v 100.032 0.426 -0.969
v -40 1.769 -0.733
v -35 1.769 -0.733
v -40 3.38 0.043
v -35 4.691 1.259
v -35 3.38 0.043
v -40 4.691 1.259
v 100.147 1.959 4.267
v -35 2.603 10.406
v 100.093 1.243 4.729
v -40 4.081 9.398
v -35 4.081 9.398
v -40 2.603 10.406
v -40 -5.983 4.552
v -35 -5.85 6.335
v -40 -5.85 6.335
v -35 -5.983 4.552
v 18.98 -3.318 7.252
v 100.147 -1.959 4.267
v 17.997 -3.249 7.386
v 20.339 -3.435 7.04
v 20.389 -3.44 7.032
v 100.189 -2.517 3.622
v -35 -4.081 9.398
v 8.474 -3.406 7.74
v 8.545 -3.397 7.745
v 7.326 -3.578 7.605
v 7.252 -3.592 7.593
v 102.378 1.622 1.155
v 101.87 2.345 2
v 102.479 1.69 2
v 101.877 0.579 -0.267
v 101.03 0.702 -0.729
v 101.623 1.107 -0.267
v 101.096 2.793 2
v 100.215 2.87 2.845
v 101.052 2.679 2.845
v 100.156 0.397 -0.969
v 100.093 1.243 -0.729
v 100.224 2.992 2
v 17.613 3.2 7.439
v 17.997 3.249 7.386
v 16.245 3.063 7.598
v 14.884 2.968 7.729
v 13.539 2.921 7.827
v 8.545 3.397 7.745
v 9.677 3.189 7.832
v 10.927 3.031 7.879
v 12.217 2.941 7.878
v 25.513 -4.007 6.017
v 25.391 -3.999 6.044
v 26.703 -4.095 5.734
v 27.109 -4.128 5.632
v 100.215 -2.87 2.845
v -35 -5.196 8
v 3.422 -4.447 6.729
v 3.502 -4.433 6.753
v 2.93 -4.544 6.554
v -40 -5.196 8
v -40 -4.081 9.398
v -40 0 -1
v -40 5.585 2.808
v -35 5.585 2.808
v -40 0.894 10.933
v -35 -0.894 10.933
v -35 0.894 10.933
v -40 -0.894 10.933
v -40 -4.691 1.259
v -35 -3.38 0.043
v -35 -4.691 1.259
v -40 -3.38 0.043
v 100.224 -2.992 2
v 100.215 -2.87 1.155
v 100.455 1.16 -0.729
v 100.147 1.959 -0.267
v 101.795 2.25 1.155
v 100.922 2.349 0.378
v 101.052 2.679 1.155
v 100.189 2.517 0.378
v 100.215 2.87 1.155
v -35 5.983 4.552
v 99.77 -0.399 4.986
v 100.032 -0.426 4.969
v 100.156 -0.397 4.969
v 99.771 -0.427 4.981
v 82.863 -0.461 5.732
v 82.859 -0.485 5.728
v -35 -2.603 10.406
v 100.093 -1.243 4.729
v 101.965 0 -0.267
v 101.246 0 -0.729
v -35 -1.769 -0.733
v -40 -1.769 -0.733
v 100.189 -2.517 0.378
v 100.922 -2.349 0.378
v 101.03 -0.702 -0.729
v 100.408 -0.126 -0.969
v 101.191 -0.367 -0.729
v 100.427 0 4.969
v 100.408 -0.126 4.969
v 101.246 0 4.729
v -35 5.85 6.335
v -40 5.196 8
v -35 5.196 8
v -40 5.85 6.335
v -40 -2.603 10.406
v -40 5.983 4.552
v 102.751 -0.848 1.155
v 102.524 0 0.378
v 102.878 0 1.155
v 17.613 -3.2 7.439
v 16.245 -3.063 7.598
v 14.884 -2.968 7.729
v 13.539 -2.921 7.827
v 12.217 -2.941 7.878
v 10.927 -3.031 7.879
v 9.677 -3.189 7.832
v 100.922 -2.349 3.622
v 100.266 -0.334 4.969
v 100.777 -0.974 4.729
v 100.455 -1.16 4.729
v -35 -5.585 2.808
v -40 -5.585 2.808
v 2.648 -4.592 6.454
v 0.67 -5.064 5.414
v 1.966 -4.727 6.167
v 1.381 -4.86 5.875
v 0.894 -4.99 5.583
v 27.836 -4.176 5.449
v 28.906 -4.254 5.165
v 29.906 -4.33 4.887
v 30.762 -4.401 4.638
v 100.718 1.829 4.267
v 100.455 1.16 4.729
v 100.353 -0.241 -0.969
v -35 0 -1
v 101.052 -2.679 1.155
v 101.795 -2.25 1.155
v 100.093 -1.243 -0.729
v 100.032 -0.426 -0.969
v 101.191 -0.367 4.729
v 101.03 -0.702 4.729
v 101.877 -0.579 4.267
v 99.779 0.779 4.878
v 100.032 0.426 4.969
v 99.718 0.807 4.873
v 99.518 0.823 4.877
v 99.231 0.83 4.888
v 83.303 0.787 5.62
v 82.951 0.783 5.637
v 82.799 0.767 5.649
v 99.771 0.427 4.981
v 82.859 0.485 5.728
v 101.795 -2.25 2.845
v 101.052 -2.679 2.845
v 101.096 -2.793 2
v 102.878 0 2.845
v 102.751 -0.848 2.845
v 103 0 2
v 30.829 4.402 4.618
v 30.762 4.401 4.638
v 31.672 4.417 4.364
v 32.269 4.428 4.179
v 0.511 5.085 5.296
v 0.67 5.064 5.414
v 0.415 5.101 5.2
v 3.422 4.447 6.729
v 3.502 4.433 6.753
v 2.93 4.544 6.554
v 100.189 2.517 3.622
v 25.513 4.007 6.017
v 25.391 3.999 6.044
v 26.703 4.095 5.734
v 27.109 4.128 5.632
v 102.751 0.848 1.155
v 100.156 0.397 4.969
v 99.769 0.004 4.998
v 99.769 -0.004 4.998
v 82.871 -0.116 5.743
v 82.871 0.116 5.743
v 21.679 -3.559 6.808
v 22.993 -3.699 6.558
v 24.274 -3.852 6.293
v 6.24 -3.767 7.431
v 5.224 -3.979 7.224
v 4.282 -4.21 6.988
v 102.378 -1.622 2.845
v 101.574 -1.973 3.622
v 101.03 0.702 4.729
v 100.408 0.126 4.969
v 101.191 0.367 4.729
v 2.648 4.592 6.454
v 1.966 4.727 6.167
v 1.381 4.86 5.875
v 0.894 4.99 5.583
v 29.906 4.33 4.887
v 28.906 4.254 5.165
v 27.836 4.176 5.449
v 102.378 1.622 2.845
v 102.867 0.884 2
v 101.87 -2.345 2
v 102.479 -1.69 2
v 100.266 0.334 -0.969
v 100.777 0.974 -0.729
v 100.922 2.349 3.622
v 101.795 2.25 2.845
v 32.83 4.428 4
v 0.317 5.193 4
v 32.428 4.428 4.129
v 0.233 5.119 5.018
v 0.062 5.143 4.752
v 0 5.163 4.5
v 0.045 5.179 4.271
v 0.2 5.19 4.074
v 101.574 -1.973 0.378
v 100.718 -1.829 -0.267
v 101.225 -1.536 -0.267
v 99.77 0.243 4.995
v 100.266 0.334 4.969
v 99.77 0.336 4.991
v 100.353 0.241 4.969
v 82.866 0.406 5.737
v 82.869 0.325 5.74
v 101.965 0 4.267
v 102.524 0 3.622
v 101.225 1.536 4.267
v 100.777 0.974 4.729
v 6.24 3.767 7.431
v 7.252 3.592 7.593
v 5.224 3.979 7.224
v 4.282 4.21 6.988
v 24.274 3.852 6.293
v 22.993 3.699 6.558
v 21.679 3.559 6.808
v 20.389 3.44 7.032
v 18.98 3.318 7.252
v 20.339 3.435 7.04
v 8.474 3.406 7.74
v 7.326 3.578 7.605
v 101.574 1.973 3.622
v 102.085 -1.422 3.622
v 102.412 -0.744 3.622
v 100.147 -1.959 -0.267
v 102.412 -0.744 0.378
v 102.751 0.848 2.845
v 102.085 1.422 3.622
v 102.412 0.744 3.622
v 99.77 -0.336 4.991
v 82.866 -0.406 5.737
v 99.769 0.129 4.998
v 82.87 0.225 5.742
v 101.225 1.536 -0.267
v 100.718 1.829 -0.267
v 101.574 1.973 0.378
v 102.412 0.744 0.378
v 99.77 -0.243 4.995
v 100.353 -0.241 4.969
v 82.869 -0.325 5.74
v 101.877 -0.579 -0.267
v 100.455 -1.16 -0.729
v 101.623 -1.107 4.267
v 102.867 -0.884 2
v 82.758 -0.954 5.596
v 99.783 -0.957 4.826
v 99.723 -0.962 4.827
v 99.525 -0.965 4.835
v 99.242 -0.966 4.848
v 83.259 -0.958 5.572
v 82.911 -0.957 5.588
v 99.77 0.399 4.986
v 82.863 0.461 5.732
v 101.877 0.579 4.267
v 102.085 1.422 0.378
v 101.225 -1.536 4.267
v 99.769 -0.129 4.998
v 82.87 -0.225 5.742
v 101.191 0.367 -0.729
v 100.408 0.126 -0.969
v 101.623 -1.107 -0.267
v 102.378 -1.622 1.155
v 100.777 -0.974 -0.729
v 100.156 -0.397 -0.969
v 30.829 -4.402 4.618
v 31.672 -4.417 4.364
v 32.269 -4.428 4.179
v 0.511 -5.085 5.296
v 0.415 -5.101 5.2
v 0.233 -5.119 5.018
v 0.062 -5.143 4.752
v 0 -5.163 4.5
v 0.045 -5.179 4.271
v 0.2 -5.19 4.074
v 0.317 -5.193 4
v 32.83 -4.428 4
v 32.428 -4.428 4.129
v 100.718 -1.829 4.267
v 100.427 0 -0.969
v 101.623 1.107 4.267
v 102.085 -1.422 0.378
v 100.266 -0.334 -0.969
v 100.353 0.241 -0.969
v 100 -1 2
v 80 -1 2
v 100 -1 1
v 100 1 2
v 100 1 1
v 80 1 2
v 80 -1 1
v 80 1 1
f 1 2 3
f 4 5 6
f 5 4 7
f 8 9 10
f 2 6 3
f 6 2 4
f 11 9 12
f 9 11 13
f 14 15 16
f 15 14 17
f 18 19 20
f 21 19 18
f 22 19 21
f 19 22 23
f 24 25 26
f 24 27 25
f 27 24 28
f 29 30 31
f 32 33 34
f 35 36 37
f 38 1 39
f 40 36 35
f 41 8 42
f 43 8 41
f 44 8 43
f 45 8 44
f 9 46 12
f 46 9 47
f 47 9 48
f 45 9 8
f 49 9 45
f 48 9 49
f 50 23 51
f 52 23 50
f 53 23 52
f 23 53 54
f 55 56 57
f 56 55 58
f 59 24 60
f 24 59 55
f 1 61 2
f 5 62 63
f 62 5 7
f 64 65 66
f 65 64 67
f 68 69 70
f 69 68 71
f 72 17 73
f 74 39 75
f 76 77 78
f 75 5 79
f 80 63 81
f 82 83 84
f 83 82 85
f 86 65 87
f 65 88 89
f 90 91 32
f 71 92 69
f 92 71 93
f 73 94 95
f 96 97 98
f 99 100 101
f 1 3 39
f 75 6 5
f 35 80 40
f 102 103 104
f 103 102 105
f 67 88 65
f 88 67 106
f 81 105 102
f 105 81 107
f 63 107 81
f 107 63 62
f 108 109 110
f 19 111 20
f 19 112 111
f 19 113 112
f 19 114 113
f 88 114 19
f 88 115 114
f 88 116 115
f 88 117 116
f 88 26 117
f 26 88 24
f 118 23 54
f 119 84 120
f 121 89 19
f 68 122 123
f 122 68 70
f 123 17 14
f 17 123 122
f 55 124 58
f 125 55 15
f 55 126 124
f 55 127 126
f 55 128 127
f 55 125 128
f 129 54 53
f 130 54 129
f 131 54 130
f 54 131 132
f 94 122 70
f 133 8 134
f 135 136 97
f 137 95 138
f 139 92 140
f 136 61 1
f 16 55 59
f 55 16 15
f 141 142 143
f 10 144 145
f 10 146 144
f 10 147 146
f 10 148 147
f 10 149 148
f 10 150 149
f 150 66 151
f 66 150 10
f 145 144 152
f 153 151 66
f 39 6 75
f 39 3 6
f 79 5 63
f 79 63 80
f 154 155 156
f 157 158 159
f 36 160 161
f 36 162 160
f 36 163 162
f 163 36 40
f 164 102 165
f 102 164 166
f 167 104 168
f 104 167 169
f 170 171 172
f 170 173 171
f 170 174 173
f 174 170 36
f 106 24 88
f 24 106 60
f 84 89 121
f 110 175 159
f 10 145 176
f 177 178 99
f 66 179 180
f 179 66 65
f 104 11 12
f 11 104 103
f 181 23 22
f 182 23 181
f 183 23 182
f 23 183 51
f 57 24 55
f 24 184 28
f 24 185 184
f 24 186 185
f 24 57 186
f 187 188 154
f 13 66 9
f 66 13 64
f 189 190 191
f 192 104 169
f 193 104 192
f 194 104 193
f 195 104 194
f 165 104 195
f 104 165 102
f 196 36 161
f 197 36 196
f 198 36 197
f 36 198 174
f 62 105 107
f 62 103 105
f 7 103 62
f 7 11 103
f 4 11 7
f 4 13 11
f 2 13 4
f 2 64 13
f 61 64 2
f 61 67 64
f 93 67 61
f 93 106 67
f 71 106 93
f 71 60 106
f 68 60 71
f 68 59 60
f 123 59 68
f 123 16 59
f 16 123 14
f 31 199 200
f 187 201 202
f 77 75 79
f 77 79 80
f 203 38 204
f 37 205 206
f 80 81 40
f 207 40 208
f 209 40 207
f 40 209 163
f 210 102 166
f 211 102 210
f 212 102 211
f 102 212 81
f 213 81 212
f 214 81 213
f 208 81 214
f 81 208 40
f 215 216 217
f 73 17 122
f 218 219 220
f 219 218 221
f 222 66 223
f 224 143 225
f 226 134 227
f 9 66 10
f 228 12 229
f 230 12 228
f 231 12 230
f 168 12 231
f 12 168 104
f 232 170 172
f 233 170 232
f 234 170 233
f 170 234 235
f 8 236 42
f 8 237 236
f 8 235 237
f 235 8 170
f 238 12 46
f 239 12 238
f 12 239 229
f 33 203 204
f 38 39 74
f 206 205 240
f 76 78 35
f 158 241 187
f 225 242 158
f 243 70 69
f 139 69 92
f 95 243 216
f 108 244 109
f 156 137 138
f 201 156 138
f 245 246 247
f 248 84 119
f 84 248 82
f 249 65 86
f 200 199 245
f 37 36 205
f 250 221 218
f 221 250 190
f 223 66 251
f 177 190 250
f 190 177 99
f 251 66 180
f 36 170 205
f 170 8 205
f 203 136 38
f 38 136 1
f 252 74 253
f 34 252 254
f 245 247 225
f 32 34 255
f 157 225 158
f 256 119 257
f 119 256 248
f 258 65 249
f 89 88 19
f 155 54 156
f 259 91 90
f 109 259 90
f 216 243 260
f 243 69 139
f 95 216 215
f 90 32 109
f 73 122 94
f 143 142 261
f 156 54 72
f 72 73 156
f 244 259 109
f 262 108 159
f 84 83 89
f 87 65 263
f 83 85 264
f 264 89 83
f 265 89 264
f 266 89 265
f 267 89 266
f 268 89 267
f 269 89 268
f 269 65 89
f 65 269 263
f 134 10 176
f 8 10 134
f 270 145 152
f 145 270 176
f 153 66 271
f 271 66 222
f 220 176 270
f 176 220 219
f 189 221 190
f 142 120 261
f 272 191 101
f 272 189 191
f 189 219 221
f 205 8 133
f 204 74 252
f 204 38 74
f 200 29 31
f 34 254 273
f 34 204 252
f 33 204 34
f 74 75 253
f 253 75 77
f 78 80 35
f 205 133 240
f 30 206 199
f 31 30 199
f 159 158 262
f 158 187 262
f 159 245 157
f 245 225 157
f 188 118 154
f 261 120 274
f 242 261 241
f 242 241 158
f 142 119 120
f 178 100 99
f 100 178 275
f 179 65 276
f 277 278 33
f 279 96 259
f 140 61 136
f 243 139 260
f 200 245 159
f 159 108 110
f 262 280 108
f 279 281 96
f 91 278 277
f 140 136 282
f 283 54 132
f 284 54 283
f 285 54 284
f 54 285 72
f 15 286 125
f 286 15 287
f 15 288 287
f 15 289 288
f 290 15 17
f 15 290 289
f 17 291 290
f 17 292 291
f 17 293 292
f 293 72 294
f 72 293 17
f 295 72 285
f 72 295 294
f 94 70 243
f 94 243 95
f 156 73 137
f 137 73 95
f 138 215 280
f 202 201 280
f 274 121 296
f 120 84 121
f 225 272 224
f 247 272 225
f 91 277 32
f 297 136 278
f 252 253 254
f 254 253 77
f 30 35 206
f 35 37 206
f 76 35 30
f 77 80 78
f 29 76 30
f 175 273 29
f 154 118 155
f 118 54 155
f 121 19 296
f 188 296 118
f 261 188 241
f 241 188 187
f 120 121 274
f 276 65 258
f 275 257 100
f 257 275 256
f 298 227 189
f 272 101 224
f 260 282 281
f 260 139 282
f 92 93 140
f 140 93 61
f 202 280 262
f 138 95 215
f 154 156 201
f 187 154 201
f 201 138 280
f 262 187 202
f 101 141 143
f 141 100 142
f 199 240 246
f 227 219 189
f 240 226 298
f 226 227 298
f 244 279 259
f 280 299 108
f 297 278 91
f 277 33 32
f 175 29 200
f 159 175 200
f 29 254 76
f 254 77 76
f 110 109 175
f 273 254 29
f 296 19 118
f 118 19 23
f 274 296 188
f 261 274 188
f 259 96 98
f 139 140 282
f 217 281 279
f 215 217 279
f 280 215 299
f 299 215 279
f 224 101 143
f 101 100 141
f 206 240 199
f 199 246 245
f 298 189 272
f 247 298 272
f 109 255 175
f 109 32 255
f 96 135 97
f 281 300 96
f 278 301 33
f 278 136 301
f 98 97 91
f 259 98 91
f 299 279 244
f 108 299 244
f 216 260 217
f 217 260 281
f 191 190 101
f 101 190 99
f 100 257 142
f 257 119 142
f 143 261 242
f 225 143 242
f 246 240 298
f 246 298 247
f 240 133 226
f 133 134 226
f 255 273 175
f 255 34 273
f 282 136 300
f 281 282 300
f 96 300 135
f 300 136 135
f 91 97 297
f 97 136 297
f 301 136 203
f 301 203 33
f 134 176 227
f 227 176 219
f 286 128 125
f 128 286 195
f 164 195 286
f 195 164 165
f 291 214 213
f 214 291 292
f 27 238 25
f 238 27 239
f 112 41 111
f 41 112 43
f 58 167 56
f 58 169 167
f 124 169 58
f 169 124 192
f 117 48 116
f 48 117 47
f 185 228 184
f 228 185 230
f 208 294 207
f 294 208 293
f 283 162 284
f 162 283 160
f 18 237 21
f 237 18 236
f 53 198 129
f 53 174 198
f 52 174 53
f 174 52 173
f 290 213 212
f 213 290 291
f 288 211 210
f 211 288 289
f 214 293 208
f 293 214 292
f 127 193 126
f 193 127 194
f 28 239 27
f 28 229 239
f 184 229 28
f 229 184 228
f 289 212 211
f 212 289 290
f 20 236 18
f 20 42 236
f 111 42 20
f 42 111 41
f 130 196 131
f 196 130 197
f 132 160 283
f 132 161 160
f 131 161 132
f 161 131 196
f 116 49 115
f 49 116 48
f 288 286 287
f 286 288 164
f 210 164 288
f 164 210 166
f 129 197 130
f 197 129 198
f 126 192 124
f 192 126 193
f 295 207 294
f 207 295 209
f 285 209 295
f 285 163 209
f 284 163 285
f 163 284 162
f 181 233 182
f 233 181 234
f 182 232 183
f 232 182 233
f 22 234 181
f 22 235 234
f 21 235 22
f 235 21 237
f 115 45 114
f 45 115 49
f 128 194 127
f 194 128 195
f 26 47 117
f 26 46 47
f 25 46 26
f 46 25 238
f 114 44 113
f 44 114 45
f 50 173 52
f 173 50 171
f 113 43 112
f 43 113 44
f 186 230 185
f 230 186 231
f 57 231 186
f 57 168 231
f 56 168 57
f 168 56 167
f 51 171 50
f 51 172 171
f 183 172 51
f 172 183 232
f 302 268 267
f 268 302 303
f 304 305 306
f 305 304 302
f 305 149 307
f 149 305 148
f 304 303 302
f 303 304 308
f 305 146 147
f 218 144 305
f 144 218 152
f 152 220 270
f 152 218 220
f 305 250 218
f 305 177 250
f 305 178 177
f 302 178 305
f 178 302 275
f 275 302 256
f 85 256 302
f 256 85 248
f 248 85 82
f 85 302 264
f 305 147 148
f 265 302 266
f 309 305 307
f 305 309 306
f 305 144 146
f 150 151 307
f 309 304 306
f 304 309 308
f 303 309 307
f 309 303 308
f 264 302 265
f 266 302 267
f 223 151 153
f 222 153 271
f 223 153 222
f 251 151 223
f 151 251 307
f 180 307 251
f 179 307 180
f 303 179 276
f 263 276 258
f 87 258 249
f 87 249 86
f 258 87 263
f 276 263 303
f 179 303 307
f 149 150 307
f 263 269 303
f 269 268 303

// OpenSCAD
// file: glider.scad
/*
	Openscad glider.

    Copyright (C) Tim Molteno, tim@molteno.net

    
    This program is free software: you can redistribute it and/or modify
    it under the terms of the GNU General Public License as published by
    the Free Software Foundation, either version 3 of the License, or
    (at your option) any later version.

    This program is distributed in the hope that it will be useful,
    but WITHOUT ANY WARRANTY; without even the implied warranty of
    MERCHANTABILITY or FITNESS FOR A PARTICULAR PURPOSE.  See the
    GNU General Public License for more details.

    You should have received a copy of the GNU General Public License
    along with this program.  If not, see <http://www.gnu.org/licenses/>.
*/

/* NACA 5412 Airfoil M=5.0% P=40.0% T=12.0% */

module airfoil(s) {
rotate([0,0,-2]) scale([s,s,s]) polygon(points=[
 [1.000000,-0.000000], [0.998459, 0.000480], [0.993844, 0.001912], [0.986185, 0.004266],
 [0.975528, 0.007497], [0.961940, 0.011541], [0.945503, 0.016321], [0.926320, 0.021747],
 [0.904508, 0.027720], [0.880203, 0.034131], [0.853553, 0.040868], [0.824724, 0.047815],
 [0.793893, 0.054856], [0.761249, 0.061875], [0.726995, 0.068760], [0.691342, 0.075399],
 [0.654508, 0.081690], [0.616723, 0.087531], [0.578217, 0.092831], [0.539230, 0.097504],
 [0.500000, 0.101473], [0.460770, 0.104671], [0.421783, 0.107042], [0.383277, 0.108495],
 [0.345492, 0.108628], [0.308658, 0.107381], [0.273005, 0.104801], [0.238751, 0.100962],
 [0.206107, 0.095964], [0.175276, 0.089926], [0.146447, 0.082992], [0.119797, 0.075318],
 [0.095492, 0.067072], [0.073680, 0.058429], [0.054497, 0.049563], [0.038060, 0.040642],
 [0.024472, 0.031824], [0.013815, 0.023248], [0.006156, 0.015030], [0.001541, 0.007261],
 [0.000000, 0.000000], [0.001541,-0.006492], [0.006156,-0.011976], [0.013815,-0.016460],
 [0.024472,-0.019963], [0.038060,-0.022517], [0.054497,-0.024170], [0.073680,-0.024982],
 [0.095492,-0.025026], [0.119797,-0.024389], [0.146447,-0.023173], [0.175276,-0.021490],
 [0.206107,-0.019460], [0.238751,-0.017213], [0.273005,-0.014881], [0.308658,-0.012596],
 [0.345492,-0.010485], [0.383277,-0.008670], [0.421783,-0.007174], [0.460770,-0.005697],
 [0.500000,-0.004250], [0.539230,-0.002888], [0.578217,-0.001653], [0.616723,-0.000578],
 [0.654508, 0.000317], [0.691342, 0.001023], [0.726995, 0.001539], [0.761249, 0.001875],
 [0.793893, 0.002047], [0.824724, 0.002077], [0.853553, 0.001991], [0.880203, 0.001815],
 [0.904508, 0.001578], [0.926320, 0.001305], [0.945503, 0.001019], [0.961940, 0.000743],
 [0.975528, 0.000494], [0.986185, 0.000286], [0.993844, 0.000130], [0.998459, 0.000033],
 [1.000000, 0.000000]]);
}

/* This is a foil with a flat bottom for easy printing */
module flat_foil(s) {
  difference() {
    translate([0, 0.5]) airfoil(s);
    translate([0,-2]) square([s,2]);
  }
}
	
wingspan = 150;
tail_length = 80;
nose_length = 40;

wing_chord = 35;
wing_z = 4;

module wing_left() {
  rotate([90,0,0]) hull() {
     translate([35,0,wingspan/2]) linear_extrude(height=0.1, center=true) flat_foil(20);
     linear_extrude(height=0.11, center=true) flat_foil(wing_chord);
    }
}

module wing_center() {
  rotate([90,0,0]) hull() {
     translate([0,0,wingspan/2]) linear_extrude(height=1, center=true) flat_foil(wing_chord);
     translate([0,0,-wingspan/2]) linear_extrude(height=1, center=true) flat_foil(wing_chord);
    }
}


module wing_right() {
  mirror([0,1,0]) wing_left();
}


module fuselage() {
  difference() {
    hull() {
      translate([-nose_length,0,5]) rotate([0,90,0]) cylinder(r=6, h=5, $fn=21);
      translate([tail_length+20,0,2]) sphere(r=3, $fn=21);
    }
    translate([0,0,wing_z]) wing_center();
    translate([tail_length,0,0]) stabilizer_vert();
  }
}

module stabilizer_right() {
  hull() {
    cube([20,2,1.5]);
    translate([15, 20, 0]) cylinder(r=6, h=0.6);
  }
}

module stabilizer_left() {
  mirror([0,1,0]) stabilizer_right();
}

module stabilizer_vert() {
  hull() {
    translate([0, -1, 1]) cube([20,2,1]);
    translate([15, 0, 15]) rotate([90,0,0]) cylinder(r=4, h=0.8);
  }
}

/* This is the whole plane, as assembled. To print, you
   must generate a separate .stl for each of these parts
*/
module plane() {
  union() {
    fuselage();
    %translate([0,0,wing_z]) {
      wing_center();
      translate([0, wingspan/2,0]) rotate([10,0,0]) wing_right();
      translate([0, -wingspan/2,0]) rotate([-10,0,0])  wing_left();
    }
    translate([tail_length,0,0]) stabilizer_right();
    translate([tail_length,0,0]) stabilizer_left();
    %translate([tail_length,0,0]) stabilizer_vert();
  }
}

plane();
// main file
/*
	Openscad glider.

    Center Wing

    Copyright (C) Tim Molteno, tim@molteno.net

    
    This program is free software: you can redistribute it and/or modify
    it under the terms of the GNU General Public License as published by
    the Free Software Foundation, either version 3 of the License, or
    (at your option) any later version.

    This program is distributed in the hope that it will be useful,
    but WITHOUT ANY WARRANTY; without even the implied warranty of
    MERCHANTABILITY or FITNESS FOR A PARTICULAR PURPOSE.  See the
    GNU General Public License for more details.

    You should have received a copy of the GNU General Public License
    along with this program.  If not, see <http://www.gnu.org/licenses/>.
*/
use <glider.scad>;

fuselage();
